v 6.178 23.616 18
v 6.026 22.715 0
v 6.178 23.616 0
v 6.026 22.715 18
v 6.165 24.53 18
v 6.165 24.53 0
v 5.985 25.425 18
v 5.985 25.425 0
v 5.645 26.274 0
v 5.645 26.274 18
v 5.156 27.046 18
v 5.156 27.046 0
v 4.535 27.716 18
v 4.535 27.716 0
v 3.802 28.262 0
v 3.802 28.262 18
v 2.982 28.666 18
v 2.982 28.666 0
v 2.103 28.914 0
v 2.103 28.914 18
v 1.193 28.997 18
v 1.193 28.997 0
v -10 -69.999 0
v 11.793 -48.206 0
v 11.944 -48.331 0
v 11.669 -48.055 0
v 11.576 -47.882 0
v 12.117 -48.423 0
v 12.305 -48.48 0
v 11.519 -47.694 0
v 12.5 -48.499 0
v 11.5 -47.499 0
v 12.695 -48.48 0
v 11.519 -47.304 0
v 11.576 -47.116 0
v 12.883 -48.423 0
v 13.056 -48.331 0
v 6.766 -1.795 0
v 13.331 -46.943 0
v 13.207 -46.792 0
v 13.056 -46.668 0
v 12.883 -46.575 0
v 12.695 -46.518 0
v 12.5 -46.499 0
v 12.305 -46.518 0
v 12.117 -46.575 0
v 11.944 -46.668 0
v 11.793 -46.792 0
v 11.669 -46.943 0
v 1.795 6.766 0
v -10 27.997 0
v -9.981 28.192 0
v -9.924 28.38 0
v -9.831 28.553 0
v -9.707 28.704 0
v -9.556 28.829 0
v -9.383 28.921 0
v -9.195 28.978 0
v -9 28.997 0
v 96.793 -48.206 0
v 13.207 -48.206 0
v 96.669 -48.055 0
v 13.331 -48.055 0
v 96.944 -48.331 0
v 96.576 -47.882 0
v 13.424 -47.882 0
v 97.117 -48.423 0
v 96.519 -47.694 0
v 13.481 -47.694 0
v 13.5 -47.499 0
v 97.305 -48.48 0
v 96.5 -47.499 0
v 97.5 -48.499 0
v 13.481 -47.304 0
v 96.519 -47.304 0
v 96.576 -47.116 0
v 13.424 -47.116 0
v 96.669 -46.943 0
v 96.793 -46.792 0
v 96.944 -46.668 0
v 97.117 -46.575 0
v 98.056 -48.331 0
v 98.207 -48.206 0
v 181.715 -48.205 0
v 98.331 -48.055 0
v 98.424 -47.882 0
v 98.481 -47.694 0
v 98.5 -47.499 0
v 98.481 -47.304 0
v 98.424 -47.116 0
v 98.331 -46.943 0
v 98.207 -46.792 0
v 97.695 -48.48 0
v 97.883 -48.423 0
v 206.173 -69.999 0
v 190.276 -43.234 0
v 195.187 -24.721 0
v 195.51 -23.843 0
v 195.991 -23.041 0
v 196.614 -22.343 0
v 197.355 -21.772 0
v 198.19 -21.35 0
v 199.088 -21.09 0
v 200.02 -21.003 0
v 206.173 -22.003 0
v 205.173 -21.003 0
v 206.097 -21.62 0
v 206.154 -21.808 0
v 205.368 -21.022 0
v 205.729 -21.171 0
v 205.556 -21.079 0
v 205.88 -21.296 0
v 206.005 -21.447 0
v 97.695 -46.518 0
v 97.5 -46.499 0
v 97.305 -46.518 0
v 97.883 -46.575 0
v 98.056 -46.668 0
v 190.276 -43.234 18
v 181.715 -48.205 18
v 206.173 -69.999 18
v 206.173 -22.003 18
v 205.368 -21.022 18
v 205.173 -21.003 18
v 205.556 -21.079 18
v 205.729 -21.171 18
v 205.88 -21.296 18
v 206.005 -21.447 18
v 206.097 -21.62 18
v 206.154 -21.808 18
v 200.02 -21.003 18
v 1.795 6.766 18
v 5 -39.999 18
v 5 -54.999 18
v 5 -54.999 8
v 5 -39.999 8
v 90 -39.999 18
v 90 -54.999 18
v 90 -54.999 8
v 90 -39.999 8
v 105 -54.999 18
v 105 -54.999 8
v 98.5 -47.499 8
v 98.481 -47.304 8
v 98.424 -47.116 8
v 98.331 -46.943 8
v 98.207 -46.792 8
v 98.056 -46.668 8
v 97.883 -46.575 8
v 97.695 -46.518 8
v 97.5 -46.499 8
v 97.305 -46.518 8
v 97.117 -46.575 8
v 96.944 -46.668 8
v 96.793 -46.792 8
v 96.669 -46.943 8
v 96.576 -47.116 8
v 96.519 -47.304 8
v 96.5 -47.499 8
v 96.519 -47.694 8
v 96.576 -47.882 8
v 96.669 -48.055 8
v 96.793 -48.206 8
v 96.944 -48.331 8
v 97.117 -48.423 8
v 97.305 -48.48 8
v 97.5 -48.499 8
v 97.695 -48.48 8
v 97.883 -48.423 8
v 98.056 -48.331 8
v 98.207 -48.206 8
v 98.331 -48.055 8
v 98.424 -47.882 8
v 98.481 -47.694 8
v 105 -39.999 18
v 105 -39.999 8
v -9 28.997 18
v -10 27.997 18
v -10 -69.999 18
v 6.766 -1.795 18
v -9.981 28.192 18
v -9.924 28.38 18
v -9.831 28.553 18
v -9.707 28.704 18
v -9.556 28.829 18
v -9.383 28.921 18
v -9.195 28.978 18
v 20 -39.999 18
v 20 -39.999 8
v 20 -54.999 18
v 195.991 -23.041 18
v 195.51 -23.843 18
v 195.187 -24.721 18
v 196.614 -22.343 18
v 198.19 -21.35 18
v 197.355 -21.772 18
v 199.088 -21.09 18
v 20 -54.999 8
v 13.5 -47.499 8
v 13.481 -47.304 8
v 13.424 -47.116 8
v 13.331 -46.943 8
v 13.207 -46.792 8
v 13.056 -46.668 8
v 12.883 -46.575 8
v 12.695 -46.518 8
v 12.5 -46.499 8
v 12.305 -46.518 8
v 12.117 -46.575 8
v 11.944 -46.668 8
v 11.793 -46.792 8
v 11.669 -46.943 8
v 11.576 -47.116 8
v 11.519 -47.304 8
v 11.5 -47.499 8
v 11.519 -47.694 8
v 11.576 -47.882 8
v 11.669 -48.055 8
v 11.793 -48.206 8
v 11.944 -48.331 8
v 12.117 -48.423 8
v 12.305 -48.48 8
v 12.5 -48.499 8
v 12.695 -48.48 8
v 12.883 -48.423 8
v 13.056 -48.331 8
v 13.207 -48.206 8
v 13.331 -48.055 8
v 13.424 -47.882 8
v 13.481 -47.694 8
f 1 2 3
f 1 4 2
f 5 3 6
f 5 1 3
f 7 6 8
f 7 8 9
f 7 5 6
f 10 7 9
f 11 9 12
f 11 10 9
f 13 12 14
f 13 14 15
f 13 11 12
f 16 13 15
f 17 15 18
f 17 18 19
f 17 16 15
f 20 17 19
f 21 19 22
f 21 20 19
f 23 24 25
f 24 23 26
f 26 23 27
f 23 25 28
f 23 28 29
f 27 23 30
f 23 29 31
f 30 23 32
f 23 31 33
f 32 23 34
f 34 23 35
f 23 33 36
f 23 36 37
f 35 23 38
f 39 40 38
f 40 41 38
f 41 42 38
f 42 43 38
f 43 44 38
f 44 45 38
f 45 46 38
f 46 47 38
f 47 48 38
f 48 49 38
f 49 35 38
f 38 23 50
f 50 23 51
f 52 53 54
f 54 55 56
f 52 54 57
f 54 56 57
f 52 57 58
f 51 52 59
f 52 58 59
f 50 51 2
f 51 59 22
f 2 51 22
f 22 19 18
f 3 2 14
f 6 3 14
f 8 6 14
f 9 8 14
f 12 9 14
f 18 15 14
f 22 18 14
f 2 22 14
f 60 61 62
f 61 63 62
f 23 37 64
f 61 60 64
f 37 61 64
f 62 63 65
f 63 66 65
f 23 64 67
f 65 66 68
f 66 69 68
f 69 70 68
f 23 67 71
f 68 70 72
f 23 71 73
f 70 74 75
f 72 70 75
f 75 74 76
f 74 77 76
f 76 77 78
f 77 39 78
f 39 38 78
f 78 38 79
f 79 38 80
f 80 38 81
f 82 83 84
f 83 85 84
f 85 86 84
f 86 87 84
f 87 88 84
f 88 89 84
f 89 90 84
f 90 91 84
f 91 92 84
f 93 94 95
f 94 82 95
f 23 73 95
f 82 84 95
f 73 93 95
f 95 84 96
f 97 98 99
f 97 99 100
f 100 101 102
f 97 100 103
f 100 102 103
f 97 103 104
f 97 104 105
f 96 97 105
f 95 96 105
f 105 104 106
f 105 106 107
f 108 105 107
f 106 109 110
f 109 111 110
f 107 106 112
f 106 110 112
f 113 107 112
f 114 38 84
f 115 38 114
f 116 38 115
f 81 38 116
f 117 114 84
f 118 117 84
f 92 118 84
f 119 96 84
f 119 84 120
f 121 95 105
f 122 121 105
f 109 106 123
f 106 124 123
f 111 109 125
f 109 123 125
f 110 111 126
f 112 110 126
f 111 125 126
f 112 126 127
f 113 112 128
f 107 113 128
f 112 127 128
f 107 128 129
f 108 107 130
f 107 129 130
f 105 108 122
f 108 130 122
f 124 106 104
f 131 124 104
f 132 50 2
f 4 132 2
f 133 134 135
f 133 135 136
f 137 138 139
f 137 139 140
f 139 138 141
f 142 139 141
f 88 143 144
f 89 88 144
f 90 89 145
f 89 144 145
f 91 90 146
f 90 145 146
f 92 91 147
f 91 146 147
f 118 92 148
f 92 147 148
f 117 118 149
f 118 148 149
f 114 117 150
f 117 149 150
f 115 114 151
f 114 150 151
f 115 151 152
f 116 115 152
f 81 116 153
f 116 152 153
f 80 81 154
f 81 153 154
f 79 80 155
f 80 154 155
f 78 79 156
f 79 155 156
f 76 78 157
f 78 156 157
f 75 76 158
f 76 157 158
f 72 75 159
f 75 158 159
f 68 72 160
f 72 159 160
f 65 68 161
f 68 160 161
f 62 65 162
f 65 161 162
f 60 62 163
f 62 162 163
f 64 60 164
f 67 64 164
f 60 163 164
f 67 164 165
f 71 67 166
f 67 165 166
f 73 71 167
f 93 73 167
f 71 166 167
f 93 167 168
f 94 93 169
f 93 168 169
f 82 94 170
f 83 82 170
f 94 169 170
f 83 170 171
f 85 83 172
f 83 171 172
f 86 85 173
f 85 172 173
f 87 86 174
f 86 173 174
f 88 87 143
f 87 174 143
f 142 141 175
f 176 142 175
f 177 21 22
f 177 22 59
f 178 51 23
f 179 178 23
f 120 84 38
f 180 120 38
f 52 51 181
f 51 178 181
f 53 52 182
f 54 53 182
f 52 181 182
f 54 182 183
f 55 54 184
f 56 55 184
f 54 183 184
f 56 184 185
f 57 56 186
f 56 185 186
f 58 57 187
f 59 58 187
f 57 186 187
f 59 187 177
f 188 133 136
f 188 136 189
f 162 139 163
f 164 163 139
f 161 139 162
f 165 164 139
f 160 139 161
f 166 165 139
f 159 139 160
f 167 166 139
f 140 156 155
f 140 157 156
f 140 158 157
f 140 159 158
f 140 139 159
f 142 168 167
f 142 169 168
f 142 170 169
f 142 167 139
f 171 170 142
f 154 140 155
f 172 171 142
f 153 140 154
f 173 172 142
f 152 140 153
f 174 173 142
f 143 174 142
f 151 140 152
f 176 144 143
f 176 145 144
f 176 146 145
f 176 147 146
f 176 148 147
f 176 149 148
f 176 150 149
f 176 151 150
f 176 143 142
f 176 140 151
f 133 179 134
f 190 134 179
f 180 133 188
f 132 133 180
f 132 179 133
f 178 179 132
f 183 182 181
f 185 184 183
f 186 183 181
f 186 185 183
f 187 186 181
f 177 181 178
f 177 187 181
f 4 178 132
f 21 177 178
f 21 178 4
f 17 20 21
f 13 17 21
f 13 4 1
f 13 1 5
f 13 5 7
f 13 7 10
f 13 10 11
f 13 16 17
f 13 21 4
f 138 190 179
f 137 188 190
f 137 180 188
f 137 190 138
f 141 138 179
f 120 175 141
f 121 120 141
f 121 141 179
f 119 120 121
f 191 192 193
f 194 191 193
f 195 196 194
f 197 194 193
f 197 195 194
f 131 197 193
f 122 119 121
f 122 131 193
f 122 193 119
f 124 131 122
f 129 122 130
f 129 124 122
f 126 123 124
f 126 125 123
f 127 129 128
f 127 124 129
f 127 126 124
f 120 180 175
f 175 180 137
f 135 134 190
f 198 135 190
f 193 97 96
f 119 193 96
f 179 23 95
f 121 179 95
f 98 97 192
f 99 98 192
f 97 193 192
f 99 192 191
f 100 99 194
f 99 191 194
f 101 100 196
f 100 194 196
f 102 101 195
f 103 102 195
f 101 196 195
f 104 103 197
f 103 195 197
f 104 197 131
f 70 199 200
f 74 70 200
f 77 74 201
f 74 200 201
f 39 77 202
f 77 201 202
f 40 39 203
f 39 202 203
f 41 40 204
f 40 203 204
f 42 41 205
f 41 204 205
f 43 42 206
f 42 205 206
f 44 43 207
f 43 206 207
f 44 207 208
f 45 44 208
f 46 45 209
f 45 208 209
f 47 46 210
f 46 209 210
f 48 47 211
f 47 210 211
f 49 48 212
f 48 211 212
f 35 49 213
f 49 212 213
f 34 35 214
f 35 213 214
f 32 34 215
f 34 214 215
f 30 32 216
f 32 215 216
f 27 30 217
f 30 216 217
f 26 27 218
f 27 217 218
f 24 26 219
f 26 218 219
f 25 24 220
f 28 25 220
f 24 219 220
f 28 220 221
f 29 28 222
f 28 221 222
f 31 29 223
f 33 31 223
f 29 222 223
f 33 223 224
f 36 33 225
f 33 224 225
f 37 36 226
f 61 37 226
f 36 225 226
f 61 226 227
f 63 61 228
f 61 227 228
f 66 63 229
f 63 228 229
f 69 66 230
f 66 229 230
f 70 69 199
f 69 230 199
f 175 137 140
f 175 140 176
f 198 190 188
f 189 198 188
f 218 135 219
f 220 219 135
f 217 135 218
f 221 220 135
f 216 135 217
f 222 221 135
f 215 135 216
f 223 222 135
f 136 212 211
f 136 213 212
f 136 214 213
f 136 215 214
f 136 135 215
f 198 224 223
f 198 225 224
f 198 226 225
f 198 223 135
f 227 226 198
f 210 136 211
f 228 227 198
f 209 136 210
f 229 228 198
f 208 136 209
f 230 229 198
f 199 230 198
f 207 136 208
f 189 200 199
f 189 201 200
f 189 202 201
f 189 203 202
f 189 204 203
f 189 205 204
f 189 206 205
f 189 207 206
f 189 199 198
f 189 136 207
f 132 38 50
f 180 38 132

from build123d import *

# Parameters (mm, degrees)
PAD_DEPTH       = 18
FILLET_R        = 5
FILLET001_R     = 5
FILLET002_R     = 1
FILLET003_R     = 1
CHAMFER_SIZE    = 7
CHAMFER001_SIZE = 7
SKETCH001_W     = 15
SKETCH001_H     = 15
POCKET_DEPTH    = 10
SKETCH002_R     = 1
POCKET001_DEPTH = 8
SKETCH003_R     = 1
POCKET002_DEPTH = 8


with BuildPart() as part:
    # Sketch → Pad (new body)
    with BuildSketch(Plane.XY):
        Polygon((206.173076, -21.002959), (196.173076, -21.002959), (188.480768, -50), (0, 0), (7.692308, 28.997041), (-10, 28.997041), (-10, -69.999032), (206.173076, -69.999032), align=None)
    extrude(amount=PAD_DEPTH)

    # Fillet
    fillet_edges = [part.edges().sort_by_distance(p)[0] for p in [
        (7.692308, 28.997041, 9),
    ]]
    fillet(fillet_edges, radius=FILLET_R)

    # Fillet001
    fillet001_edges = [part.edges().sort_by_distance(p)[0] for p in [
        (196.173076, -21.002959, 9),
    ]]
    fillet(fillet001_edges, radius=FILLET001_R)

    # Fillet002
    fillet002_edges = [part.edges().sort_by_distance(p)[0] for p in [
        (206.173076, -21.002959, 9),
    ]]
    fillet(fillet002_edges, radius=FILLET002_R)

    # Fillet003
    fillet003_edges = [part.edges().sort_by_distance(p)[0] for p in [
        (-10, 28.997041, 9),
    ]]
    fillet(fillet003_edges, radius=FILLET003_R)

    # Chamfer
    chamfer_edges = [part.edges().sort_by_distance(p)[0] for p in [
        (0, 0, 9),
    ]]
    chamfer(chamfer_edges, length=CHAMFER_SIZE)

    # Chamfer001
    chamfer001_edges = [part.edges().sort_by_distance(p)[0] for p in [
        (188.480768, -50, 9),
    ]]
    chamfer(chamfer001_edges, length=CHAMFER001_SIZE)

    # Sketch001 → Pocket (cut)
    with BuildSketch(Plane.XY.offset(18)):
        with Locations((12.5, -47.499032)):
            Rectangle(SKETCH001_W, SKETCH001_H)
        with Locations((97.5, -47.499032)):
            Rectangle(SKETCH001_W, SKETCH001_H)
    extrude(amount=-POCKET_DEPTH, mode=Mode.SUBTRACT)

    # Sketch002 → Pocket001 (cut)
    with BuildSketch(Plane.XY.offset(8)):
        with Locations((12.5, -47.499032)):
            Circle(SKETCH002_R)
    extrude(amount=-POCKET001_DEPTH, mode=Mode.SUBTRACT)

    # Sketch003 → Pocket002 (cut)
    with BuildSketch(Plane.XY.offset(8)):
        with Locations((97.5, -47.499032)):
            Circle(SKETCH003_R)
    extrude(amount=-POCKET002_DEPTH, mode=Mode.SUBTRACT)


solid = part.part
